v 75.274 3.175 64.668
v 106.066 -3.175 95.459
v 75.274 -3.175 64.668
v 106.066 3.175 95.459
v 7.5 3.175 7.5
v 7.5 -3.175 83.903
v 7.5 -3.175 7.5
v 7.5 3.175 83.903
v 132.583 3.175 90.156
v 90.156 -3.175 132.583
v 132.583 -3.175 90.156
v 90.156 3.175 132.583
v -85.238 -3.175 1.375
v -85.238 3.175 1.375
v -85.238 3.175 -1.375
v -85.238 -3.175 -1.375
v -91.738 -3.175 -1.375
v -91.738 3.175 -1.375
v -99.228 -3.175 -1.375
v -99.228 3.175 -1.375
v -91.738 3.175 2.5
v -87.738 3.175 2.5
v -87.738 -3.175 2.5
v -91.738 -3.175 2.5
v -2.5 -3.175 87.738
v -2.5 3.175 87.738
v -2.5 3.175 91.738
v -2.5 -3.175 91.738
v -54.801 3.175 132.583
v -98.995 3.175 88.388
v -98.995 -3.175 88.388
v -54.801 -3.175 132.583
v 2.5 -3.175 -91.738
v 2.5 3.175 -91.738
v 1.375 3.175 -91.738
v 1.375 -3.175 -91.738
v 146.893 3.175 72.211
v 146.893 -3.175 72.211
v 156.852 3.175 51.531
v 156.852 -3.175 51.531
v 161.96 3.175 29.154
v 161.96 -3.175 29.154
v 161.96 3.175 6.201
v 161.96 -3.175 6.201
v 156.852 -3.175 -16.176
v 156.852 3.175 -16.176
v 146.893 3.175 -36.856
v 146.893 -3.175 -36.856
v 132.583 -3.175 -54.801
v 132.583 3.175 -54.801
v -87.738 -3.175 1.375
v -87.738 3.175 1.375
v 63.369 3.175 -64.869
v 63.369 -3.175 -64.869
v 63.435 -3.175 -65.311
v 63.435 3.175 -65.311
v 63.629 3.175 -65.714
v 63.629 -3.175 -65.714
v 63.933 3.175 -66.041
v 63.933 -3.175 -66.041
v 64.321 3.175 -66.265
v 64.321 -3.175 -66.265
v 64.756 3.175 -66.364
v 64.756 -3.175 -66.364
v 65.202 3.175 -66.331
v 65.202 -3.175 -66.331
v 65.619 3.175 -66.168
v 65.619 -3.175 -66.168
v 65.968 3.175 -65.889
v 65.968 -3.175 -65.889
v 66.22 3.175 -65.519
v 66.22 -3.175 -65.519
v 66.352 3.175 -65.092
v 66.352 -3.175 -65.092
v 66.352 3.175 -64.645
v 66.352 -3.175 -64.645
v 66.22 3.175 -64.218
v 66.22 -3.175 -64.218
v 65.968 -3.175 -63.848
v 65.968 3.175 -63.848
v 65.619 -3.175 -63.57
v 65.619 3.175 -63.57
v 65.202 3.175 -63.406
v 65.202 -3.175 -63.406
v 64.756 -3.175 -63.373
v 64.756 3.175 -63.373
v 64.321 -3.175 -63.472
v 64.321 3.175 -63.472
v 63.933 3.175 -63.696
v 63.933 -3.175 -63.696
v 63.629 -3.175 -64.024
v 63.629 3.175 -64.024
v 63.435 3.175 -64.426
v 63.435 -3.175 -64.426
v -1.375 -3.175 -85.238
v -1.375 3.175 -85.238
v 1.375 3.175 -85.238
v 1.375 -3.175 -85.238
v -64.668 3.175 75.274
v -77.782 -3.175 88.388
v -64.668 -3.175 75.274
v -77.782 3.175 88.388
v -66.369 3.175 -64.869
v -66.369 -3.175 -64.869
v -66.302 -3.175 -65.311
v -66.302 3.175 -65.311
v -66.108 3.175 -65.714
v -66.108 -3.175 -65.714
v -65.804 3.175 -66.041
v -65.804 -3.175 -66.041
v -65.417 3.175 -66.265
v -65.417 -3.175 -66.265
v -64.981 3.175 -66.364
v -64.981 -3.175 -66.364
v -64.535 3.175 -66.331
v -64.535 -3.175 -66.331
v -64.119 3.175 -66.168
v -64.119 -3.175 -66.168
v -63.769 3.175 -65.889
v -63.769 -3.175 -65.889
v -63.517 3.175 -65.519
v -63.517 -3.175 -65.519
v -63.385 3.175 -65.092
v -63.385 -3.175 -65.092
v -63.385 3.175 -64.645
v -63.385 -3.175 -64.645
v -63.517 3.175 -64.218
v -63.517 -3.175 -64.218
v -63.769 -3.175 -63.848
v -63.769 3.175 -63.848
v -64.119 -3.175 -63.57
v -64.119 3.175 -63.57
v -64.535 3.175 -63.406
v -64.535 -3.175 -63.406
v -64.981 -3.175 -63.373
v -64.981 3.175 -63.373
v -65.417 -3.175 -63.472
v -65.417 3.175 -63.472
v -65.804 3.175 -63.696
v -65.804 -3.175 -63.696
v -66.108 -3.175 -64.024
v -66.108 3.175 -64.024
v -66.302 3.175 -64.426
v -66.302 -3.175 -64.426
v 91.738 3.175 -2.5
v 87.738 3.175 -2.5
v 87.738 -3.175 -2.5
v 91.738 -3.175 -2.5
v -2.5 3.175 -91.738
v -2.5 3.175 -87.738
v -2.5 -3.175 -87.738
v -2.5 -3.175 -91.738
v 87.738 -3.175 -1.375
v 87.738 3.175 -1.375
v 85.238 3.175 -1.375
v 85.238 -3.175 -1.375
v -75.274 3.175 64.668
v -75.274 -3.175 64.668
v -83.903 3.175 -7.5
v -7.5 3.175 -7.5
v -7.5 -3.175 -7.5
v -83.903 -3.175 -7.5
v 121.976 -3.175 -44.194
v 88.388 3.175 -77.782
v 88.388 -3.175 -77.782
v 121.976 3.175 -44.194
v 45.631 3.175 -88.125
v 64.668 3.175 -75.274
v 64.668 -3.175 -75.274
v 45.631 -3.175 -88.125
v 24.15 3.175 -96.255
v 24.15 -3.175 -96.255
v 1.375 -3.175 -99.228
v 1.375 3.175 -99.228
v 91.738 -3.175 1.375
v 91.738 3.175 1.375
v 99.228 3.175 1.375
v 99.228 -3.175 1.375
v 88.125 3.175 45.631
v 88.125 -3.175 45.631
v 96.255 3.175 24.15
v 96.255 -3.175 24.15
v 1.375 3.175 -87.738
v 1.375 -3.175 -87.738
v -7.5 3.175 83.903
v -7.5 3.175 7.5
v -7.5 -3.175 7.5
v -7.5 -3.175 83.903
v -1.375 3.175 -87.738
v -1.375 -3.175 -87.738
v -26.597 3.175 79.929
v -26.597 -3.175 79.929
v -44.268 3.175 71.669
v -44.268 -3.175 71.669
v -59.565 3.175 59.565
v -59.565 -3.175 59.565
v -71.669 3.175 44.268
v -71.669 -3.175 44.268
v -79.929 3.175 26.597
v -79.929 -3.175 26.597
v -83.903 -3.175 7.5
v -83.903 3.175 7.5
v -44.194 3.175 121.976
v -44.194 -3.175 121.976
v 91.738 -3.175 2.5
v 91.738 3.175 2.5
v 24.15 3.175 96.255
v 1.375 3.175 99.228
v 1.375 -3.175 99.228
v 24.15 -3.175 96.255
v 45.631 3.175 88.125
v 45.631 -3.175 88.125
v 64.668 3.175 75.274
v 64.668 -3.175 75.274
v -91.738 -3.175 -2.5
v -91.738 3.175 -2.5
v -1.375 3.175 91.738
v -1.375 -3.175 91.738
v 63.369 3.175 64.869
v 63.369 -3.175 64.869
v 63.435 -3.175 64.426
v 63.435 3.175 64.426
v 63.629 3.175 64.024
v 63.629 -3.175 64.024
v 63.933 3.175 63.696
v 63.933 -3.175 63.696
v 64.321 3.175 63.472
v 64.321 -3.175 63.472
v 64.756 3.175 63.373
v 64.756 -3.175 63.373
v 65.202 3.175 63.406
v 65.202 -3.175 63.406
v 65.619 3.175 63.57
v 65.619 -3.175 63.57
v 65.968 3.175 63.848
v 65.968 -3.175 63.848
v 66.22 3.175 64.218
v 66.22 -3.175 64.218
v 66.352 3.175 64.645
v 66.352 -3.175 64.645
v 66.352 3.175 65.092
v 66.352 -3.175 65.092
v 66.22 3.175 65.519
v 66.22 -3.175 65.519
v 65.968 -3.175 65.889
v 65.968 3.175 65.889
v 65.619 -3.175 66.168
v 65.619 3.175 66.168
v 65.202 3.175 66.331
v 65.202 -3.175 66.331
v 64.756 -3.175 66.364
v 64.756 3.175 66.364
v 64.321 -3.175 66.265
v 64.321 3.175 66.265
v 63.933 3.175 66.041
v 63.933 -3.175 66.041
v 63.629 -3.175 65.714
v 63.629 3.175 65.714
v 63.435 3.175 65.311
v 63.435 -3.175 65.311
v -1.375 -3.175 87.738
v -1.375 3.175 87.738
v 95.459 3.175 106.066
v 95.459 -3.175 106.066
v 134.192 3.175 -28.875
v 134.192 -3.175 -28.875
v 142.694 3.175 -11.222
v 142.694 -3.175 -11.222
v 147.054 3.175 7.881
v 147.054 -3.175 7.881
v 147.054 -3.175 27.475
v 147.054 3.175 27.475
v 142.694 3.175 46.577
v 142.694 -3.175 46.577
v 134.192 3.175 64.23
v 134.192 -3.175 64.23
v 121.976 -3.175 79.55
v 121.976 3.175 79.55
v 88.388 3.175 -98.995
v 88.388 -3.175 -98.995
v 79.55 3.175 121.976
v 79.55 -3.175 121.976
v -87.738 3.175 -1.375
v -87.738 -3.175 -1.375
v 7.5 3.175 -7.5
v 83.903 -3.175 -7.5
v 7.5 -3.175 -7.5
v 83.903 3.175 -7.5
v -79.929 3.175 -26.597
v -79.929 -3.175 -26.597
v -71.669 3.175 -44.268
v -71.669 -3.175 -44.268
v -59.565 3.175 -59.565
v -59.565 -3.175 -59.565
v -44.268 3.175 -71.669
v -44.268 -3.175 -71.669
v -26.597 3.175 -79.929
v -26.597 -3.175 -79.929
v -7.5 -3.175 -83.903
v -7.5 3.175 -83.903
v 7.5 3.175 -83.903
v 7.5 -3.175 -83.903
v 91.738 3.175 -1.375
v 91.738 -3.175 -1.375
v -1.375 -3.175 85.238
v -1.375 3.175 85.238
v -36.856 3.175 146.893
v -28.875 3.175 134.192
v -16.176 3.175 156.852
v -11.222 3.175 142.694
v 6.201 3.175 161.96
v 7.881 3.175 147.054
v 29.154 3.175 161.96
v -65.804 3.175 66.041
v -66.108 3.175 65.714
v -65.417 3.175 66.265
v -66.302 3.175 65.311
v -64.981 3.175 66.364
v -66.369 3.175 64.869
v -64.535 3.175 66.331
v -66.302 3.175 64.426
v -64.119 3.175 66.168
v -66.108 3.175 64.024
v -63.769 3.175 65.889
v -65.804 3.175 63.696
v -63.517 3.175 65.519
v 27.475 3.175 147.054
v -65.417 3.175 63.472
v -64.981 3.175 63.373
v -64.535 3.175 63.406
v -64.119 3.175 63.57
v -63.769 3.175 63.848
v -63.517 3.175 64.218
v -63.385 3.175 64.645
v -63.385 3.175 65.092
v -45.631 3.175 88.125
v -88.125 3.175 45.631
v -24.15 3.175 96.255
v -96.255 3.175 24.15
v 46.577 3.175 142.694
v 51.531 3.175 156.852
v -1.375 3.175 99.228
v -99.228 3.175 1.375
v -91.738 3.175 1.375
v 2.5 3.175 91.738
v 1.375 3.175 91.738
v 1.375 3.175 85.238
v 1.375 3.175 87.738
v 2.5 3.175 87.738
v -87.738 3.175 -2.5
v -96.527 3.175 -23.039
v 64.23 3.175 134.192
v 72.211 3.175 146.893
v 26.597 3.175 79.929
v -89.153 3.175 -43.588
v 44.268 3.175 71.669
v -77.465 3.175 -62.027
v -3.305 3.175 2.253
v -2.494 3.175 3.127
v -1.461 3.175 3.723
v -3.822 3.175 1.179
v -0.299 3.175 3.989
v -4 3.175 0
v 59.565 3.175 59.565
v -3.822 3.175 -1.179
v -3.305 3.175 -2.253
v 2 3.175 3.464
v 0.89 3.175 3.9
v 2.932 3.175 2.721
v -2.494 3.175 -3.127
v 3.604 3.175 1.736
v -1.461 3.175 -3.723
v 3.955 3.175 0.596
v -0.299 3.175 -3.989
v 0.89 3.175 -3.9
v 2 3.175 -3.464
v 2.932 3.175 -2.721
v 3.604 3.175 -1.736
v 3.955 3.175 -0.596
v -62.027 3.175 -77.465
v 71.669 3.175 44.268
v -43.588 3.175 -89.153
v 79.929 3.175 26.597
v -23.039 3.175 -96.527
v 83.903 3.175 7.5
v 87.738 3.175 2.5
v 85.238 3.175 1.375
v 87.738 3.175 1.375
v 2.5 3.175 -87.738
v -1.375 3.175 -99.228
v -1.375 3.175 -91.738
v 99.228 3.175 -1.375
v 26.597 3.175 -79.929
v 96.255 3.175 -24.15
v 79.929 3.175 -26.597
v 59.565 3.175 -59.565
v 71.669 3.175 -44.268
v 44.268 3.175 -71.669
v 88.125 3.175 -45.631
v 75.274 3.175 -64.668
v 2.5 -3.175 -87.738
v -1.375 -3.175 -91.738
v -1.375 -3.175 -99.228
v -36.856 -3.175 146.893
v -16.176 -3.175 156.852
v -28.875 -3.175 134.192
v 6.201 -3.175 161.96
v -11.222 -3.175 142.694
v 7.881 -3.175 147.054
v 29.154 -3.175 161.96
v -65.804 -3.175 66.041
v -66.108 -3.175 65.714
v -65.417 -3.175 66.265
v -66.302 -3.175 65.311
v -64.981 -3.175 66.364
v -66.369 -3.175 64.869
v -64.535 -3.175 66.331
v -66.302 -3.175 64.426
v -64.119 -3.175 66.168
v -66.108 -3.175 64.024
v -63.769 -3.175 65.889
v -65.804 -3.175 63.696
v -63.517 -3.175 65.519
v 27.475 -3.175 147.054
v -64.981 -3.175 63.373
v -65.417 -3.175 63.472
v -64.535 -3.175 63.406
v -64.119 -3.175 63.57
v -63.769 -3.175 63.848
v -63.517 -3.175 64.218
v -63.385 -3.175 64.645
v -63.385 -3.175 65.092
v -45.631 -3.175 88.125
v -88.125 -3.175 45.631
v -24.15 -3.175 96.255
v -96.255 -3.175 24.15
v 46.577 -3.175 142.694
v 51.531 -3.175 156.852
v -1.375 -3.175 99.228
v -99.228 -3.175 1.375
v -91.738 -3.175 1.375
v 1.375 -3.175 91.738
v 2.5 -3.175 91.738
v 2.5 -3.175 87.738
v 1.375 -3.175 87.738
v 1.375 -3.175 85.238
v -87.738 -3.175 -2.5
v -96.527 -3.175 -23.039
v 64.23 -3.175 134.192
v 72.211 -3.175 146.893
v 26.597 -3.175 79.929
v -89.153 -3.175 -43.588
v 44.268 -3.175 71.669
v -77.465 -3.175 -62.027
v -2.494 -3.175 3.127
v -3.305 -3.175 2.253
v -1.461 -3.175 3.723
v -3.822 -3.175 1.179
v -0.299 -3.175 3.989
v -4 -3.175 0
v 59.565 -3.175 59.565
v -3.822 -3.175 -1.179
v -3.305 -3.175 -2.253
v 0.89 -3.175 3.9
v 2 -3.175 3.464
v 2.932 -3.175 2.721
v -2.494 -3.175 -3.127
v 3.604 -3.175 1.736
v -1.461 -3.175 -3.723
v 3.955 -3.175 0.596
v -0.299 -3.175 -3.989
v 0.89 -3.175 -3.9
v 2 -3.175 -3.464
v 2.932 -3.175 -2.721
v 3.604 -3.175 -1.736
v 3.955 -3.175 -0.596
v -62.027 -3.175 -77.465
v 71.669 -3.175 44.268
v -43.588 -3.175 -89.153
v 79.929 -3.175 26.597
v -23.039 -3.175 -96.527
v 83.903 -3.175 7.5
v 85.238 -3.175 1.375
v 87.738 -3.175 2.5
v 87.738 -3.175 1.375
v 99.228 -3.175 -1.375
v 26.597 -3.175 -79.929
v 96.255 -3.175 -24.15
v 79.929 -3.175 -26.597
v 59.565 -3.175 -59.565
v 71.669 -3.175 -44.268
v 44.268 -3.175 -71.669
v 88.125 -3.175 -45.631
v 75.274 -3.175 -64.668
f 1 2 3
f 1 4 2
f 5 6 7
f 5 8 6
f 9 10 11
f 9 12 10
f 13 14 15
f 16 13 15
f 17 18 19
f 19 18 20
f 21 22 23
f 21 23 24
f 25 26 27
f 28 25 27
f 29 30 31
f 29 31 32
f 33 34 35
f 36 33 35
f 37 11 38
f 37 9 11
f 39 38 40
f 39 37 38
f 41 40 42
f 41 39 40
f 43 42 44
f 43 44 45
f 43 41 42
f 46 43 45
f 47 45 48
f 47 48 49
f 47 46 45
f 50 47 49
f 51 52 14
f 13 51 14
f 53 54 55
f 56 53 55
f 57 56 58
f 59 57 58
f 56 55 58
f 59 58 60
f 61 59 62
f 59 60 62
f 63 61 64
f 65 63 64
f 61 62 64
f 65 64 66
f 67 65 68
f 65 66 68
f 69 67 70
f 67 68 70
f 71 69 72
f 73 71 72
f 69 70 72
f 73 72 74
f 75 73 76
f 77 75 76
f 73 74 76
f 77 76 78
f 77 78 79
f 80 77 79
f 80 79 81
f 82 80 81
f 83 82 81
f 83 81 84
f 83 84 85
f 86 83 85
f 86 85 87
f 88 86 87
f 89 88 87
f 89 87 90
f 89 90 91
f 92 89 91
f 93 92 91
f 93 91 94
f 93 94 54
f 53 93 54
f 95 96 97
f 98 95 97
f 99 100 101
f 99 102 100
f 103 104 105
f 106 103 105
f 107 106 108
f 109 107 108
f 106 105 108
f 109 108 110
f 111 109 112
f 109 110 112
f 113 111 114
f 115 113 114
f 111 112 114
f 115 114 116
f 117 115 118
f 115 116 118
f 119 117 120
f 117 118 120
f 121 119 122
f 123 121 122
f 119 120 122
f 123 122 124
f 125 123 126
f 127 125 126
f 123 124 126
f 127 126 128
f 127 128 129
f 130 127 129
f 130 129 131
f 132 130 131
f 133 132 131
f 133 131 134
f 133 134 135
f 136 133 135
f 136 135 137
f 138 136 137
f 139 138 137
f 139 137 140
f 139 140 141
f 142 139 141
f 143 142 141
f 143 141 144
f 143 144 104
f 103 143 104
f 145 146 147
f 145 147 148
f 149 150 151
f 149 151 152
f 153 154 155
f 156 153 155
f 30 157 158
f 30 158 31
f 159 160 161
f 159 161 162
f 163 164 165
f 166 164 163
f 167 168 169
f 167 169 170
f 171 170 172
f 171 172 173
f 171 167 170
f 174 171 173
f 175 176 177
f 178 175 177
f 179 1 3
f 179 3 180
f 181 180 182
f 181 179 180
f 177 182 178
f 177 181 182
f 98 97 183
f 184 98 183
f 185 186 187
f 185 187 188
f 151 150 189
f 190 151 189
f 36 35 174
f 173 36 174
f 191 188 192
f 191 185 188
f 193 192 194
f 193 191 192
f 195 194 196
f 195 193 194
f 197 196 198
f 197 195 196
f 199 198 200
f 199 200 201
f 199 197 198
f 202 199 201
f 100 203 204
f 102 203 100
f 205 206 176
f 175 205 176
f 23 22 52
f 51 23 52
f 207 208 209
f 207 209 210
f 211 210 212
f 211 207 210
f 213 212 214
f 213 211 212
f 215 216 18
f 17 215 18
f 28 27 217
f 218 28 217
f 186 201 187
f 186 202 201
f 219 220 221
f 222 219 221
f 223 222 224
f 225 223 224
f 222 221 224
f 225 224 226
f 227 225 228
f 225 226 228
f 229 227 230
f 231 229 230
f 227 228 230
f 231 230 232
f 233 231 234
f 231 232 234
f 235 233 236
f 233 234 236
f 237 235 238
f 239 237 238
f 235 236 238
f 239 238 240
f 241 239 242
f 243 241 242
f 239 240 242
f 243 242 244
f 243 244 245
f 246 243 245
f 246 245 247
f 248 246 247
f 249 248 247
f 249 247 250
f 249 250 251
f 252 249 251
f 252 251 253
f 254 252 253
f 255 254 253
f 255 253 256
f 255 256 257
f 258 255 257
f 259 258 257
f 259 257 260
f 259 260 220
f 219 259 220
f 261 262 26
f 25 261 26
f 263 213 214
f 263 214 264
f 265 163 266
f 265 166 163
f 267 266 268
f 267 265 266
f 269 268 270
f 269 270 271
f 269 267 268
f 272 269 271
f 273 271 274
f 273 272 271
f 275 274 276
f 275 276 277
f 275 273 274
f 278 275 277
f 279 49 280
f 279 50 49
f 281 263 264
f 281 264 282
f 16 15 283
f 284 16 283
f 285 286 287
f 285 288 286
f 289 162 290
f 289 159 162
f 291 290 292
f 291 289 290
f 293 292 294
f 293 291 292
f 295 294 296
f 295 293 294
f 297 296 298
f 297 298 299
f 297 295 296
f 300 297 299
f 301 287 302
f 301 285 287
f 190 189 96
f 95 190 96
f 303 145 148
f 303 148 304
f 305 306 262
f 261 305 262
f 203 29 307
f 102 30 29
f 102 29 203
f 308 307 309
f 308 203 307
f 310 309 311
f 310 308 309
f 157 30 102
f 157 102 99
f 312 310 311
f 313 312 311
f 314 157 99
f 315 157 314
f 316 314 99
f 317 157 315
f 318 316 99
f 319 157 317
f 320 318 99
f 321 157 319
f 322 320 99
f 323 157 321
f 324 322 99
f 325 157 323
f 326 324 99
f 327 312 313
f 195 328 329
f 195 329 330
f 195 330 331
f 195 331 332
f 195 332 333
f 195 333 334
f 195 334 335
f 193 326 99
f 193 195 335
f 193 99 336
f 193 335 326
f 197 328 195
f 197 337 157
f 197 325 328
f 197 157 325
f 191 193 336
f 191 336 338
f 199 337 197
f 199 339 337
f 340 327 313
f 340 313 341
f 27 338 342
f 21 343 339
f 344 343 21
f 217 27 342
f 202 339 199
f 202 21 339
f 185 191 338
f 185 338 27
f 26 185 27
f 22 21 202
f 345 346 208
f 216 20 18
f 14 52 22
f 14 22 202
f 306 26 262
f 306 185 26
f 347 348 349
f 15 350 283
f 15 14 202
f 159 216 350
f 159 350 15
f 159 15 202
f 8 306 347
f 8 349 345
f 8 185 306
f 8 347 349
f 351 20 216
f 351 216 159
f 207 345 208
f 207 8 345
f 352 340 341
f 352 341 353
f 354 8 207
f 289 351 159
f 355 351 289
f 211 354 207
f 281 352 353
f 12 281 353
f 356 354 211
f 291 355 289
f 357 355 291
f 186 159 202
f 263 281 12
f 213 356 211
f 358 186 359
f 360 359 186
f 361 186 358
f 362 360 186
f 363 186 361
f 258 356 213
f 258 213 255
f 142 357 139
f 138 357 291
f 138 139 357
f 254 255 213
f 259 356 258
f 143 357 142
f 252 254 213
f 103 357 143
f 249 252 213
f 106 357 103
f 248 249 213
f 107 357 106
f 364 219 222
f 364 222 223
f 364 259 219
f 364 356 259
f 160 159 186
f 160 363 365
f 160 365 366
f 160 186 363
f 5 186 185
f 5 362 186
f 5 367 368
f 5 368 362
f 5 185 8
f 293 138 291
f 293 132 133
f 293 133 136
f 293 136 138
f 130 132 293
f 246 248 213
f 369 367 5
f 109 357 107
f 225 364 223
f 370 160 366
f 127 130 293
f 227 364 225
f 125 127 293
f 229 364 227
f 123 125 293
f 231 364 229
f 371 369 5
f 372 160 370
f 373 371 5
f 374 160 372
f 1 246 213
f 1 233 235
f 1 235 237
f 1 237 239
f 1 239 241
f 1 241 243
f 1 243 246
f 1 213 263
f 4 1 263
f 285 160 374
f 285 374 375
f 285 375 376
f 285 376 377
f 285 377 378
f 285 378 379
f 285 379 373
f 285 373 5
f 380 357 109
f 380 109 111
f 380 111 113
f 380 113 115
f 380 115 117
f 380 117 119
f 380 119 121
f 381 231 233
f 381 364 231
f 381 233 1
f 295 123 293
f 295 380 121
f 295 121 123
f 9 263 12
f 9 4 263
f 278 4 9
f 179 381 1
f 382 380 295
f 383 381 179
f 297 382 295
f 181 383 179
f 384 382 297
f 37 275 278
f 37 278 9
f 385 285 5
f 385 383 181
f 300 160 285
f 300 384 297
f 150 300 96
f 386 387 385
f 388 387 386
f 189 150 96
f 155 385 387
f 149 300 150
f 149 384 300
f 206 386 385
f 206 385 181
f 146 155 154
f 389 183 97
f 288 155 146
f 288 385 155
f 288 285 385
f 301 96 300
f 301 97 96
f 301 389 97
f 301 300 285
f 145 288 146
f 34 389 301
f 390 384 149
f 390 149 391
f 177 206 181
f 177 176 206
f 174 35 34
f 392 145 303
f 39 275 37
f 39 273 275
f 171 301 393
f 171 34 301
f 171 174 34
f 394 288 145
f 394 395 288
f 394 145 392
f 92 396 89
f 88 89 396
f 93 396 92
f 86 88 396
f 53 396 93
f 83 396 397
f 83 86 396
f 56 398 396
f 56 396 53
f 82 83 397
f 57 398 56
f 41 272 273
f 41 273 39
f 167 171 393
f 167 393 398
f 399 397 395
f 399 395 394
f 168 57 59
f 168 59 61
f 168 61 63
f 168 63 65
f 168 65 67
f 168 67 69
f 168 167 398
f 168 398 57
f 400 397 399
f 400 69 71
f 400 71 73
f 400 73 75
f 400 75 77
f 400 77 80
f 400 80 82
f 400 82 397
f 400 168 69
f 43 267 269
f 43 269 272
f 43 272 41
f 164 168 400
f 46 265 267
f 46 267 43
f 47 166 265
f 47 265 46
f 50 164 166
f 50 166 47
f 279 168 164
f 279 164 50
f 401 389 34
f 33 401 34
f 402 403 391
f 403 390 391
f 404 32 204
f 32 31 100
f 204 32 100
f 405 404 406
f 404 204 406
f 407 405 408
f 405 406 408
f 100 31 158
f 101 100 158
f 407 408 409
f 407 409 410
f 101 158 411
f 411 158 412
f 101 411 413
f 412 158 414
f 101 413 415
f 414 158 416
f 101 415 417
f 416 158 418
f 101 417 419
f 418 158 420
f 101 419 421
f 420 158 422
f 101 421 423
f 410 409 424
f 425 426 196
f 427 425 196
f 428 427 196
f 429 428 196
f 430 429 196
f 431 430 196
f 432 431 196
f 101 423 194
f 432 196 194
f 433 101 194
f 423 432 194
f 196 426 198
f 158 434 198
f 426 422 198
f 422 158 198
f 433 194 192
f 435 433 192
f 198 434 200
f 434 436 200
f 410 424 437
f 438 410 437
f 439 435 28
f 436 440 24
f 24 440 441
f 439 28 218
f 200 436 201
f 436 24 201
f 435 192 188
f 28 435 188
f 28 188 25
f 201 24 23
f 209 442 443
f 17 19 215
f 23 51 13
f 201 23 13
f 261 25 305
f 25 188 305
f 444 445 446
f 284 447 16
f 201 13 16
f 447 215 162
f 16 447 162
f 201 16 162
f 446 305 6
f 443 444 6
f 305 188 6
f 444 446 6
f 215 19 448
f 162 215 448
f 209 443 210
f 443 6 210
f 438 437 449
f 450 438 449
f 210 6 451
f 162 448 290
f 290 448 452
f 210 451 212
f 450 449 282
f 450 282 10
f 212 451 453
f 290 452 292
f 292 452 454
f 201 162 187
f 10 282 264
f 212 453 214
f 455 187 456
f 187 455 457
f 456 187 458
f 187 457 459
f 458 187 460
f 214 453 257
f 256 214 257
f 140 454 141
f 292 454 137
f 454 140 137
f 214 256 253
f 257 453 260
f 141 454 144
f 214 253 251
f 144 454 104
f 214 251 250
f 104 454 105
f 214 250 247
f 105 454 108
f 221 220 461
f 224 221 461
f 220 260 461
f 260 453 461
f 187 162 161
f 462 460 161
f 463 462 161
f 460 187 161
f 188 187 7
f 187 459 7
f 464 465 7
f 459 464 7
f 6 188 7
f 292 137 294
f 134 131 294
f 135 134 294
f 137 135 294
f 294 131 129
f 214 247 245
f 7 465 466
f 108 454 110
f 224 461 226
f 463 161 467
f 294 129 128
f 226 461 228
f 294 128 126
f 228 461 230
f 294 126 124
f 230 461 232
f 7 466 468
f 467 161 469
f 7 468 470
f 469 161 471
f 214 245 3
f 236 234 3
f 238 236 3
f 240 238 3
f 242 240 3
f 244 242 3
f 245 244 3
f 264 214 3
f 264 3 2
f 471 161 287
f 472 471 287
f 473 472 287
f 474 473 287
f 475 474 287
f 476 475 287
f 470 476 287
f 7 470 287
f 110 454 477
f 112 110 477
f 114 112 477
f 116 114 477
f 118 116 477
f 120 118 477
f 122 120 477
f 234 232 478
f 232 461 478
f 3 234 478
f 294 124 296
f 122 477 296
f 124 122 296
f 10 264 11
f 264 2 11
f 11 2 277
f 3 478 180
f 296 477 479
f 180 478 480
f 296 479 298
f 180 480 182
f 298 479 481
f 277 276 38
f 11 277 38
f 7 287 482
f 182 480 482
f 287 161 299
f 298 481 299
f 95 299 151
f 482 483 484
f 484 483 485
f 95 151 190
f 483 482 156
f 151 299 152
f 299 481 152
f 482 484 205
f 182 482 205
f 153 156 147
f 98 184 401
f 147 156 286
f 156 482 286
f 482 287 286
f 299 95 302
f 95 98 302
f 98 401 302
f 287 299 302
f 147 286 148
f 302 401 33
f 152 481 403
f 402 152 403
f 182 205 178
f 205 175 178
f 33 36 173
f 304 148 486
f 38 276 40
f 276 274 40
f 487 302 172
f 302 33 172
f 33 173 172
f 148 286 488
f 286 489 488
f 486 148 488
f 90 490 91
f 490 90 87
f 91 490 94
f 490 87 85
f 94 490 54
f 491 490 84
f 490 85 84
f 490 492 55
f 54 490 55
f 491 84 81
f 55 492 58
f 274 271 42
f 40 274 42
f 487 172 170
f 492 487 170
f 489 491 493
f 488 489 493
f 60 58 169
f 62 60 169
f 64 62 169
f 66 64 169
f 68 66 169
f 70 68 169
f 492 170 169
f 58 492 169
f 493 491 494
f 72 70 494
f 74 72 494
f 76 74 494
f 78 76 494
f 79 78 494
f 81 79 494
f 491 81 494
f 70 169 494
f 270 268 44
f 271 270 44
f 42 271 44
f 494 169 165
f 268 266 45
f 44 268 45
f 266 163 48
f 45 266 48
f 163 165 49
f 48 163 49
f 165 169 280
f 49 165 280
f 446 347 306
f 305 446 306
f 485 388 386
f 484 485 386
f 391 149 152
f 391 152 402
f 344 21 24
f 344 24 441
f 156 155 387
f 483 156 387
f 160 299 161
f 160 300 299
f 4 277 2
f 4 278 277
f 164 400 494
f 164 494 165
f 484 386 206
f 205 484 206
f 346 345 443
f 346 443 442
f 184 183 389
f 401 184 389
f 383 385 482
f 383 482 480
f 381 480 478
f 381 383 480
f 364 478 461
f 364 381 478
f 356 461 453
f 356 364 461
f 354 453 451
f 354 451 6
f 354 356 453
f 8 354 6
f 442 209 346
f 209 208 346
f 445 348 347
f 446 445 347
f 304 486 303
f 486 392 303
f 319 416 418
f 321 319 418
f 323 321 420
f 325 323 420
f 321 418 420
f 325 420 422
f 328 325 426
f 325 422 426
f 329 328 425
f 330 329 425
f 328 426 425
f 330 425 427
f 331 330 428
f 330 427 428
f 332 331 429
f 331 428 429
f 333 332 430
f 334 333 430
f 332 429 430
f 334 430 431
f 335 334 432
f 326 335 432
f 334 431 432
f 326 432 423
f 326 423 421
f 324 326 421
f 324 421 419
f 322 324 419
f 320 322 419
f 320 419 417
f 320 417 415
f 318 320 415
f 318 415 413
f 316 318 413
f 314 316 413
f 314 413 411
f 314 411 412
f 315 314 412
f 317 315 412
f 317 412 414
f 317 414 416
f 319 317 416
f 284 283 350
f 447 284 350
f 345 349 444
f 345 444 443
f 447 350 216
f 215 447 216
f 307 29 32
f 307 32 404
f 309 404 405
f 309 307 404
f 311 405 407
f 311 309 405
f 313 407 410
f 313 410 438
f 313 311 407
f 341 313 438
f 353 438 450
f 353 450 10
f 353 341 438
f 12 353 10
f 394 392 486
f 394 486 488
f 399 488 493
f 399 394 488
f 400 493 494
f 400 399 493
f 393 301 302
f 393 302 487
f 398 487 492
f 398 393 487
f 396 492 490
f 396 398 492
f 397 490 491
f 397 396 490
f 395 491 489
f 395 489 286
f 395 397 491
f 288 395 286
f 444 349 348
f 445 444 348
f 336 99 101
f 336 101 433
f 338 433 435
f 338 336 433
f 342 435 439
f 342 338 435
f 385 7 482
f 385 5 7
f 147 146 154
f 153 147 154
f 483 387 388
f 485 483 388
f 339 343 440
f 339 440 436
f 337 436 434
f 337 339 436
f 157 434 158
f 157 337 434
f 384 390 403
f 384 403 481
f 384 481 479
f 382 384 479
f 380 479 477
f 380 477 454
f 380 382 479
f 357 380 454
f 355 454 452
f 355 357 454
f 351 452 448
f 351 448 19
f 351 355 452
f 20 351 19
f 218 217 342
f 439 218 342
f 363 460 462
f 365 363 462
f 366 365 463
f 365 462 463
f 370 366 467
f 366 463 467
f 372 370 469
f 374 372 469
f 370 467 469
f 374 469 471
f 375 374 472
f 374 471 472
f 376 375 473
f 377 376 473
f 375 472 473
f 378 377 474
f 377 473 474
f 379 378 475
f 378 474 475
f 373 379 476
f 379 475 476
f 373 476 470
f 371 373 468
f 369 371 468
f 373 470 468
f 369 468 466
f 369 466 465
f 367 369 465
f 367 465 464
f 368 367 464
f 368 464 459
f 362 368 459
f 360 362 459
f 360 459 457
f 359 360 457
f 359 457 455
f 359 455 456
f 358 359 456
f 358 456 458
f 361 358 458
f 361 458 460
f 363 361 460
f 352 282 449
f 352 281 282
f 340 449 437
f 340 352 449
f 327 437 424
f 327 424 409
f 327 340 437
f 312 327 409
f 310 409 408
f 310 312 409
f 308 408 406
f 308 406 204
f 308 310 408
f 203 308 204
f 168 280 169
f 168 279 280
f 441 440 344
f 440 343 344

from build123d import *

# Parameters (mm, degrees)
BOSS_EXTRUDE1_DEPTH          = 3.175
SKETCH2_W                    = 2.75
SKETCH2_H                    = 2.5
SKETCH2_H_2                  = 4
SKETCH2_W_2                  = 1.125
SKETCH2_H_3                  = 7.5
CUT_EXTRUDE1_DEPTH           = 230.978807609
CIRPATTERN1_COUNT            = 4
F_3_0_3_DIAMETER_HOLE1_D     = 3
F_8_0_8_DIAMETER_HOLE1_D     = 8
F_8_0_8_DIAMETER_HOLE1_DEPTH = 6.35


with BuildPart() as part:
    # Sketch1 → Boss-Extrude1 (new, symmetric)
    with BuildSketch(Plane(origin=(0, 0, 0), x_dir=(1, 0, 0), z_dir=(0, 1, 0))):
        with BuildLine():
            Line((88.388347648, 98.994949366), (64.667874078, 75.274475795))
            ThreePointArc((64.667874078, 75.274475795), (-70.171862751, 70.171862751), (-75.274475795, -64.667874078))
            Line((-75.274475795, -64.667874078), (-98.994949366, -88.388347648))
            Line((-98.994949366, -88.388347648), (-54.800775542, -132.582521472))
            ThreePointArc((-54.800775542, -132.582521472), (17.67766953, -162.604076401), (90.156114601, -132.582521472))
            Line((90.156114601, -132.582521472), (132.582521472, -90.156114601))
            ThreePointArc((132.582521472, -90.156114601), (162.604076401, -17.67766953), (132.582521472, 54.800775542))
            Line((132.582521472, 54.800775542), (88.388347648, 98.994949366))
        make_face()
        with BuildLine():
            Line((-7.5, -7.5), (-7.5, -83.903460262))
            ThreePointArc((-7.5, -83.903460262), (-59.565261034, -59.565261034), (-83.903460262, -7.5))
            Line((-83.903460262, -7.5), (-7.5, -7.5))
        make_face(mode=Mode.SUBTRACT)
        with BuildLine():
            ThreePointArc((83.903460262, -7.5), (59.565261034, -59.565261034), (7.5, -83.903460262))
            Line((7.5, -83.903460262), (7.5, -7.5))
            Line((7.5, -7.5), (83.903460262, -7.5))
        make_face(mode=Mode.SUBTRACT)
        with BuildLine():
            ThreePointArc((-64.667874078, -75.274475795), (0, -99.238), (64.667874078, -75.274475795))
            Line((64.667874078, -75.274475795), (95.45941546, -106.066017178))
            Line((95.45941546, -106.066017178), (79.549512883, -121.975919755))
            ThreePointArc((79.549512883, -121.975919755), (17.67766953, -147.604076401), (-44.194173824, -121.975919755))
            Line((-44.194173824, -121.975919755), (-77.781745931, -88.388347648))
            Line((-77.781745931, -88.388347648), (-64.667874078, -75.274475795))
        make_face(mode=Mode.SUBTRACT)
        with BuildLine():
            ThreePointArc((75.274475795, -64.667874078), (99.238, 0), (75.274475795, 64.667874078))
            Line((75.274475795, 64.667874078), (88.388347648, 77.781745931))
            Line((88.388347648, 77.781745931), (121.975919755, 44.194173824))
            ThreePointArc((121.975919755, 44.194173824), (147.604076401, -17.67766953), (121.975919755, -79.549512883))
            Line((121.975919755, -79.549512883), (106.066017178, -95.45941546))
            Line((106.066017178, -95.45941546), (75.274475795, -64.667874078))
        make_face(mode=Mode.SUBTRACT)
        with BuildLine():
            Line((-7.5, 7.5), (-83.903460262, 7.5))
            ThreePointArc((-83.903460262, 7.5), (-59.565261034, 59.565261034), (-7.5, 83.903460262))
            Line((-7.5, 83.903460262), (-7.5, 7.5))
        make_face(mode=Mode.SUBTRACT)
        with BuildLine():
            ThreePointArc((7.5, 83.903460262), (59.565261034, 59.565261034), (83.903460262, 7.5))
            Line((83.903460262, 7.5), (7.5, 7.5))
            Line((7.5, 7.5), (7.5, 83.903460262))
        make_face(mode=Mode.SUBTRACT)
    extrude(amount=BOSS_EXTRUDE1_DEPTH, both=True)

    # Sketch2 → Cut-Extrude1 (cut, symmetric)
    with BuildSketch(Plane(origin=(0, 0, 0), x_dir=(1, 0, 0), z_dir=(0, 1, 0))):
        with Locations((0, 86.488)):
            Rectangle(SKETCH2_W, SKETCH2_H)
        with Locations((0, 89.738)):
            Rectangle(SKETCH2_W, SKETCH2_H_2)
        with Locations((1.9375, 89.738)):
            Rectangle(SKETCH2_W_2, SKETCH2_H_2)
        with Locations((0, 95.488)):
            Rectangle(SKETCH2_W, SKETCH2_H_3)
        with Locations((-1.9375, 89.738)):
            Rectangle(SKETCH2_W_2, SKETCH2_H_2)
    cut_extrude1 = extrude(amount=CUT_EXTRUDE1_DEPTH, both=True, mode=Mode.SUBTRACT)

    # CirPattern1: Cut-Extrude1 ×4 about axis
    cirpattern1_axis = Axis((0, 0, 0), (0, 1, 0))
    for i in range(1, CIRPATTERN1_COUNT):
        add(cut_extrude1.rotate(cirpattern1_axis, i * 360 / CIRPATTERN1_COUNT), mode=Mode.SUBTRACT)

    # Ø3.0 (3) Diameter Hole1 (through all)
    with Locations(Plane(origin=(0, 3.175, 0), x_dir=(1, 0, 0), z_dir=(0, 1, 0))):
        with Locations((-64.868561892, -64.868561892), (0, 0), (-64.868561892, 64.868561892), (64.868561892, 64.868561892), (64.868561892, -64.868561892)):
            Hole(F_3_0_3_DIAMETER_HOLE1_D / 2)

    # Ø8.0 (8) Diameter Hole1
    with Locations(Plane(origin=(0, 3.175, 0), x_dir=(1, 0, 0), z_dir=(0, 1, 0))):
        with Locations((0, 0)):
            Hole(F_8_0_8_DIAMETER_HOLE1_D / 2, depth=F_8_0_8_DIAMETER_HOLE1_DEPTH)


solid = part.part
